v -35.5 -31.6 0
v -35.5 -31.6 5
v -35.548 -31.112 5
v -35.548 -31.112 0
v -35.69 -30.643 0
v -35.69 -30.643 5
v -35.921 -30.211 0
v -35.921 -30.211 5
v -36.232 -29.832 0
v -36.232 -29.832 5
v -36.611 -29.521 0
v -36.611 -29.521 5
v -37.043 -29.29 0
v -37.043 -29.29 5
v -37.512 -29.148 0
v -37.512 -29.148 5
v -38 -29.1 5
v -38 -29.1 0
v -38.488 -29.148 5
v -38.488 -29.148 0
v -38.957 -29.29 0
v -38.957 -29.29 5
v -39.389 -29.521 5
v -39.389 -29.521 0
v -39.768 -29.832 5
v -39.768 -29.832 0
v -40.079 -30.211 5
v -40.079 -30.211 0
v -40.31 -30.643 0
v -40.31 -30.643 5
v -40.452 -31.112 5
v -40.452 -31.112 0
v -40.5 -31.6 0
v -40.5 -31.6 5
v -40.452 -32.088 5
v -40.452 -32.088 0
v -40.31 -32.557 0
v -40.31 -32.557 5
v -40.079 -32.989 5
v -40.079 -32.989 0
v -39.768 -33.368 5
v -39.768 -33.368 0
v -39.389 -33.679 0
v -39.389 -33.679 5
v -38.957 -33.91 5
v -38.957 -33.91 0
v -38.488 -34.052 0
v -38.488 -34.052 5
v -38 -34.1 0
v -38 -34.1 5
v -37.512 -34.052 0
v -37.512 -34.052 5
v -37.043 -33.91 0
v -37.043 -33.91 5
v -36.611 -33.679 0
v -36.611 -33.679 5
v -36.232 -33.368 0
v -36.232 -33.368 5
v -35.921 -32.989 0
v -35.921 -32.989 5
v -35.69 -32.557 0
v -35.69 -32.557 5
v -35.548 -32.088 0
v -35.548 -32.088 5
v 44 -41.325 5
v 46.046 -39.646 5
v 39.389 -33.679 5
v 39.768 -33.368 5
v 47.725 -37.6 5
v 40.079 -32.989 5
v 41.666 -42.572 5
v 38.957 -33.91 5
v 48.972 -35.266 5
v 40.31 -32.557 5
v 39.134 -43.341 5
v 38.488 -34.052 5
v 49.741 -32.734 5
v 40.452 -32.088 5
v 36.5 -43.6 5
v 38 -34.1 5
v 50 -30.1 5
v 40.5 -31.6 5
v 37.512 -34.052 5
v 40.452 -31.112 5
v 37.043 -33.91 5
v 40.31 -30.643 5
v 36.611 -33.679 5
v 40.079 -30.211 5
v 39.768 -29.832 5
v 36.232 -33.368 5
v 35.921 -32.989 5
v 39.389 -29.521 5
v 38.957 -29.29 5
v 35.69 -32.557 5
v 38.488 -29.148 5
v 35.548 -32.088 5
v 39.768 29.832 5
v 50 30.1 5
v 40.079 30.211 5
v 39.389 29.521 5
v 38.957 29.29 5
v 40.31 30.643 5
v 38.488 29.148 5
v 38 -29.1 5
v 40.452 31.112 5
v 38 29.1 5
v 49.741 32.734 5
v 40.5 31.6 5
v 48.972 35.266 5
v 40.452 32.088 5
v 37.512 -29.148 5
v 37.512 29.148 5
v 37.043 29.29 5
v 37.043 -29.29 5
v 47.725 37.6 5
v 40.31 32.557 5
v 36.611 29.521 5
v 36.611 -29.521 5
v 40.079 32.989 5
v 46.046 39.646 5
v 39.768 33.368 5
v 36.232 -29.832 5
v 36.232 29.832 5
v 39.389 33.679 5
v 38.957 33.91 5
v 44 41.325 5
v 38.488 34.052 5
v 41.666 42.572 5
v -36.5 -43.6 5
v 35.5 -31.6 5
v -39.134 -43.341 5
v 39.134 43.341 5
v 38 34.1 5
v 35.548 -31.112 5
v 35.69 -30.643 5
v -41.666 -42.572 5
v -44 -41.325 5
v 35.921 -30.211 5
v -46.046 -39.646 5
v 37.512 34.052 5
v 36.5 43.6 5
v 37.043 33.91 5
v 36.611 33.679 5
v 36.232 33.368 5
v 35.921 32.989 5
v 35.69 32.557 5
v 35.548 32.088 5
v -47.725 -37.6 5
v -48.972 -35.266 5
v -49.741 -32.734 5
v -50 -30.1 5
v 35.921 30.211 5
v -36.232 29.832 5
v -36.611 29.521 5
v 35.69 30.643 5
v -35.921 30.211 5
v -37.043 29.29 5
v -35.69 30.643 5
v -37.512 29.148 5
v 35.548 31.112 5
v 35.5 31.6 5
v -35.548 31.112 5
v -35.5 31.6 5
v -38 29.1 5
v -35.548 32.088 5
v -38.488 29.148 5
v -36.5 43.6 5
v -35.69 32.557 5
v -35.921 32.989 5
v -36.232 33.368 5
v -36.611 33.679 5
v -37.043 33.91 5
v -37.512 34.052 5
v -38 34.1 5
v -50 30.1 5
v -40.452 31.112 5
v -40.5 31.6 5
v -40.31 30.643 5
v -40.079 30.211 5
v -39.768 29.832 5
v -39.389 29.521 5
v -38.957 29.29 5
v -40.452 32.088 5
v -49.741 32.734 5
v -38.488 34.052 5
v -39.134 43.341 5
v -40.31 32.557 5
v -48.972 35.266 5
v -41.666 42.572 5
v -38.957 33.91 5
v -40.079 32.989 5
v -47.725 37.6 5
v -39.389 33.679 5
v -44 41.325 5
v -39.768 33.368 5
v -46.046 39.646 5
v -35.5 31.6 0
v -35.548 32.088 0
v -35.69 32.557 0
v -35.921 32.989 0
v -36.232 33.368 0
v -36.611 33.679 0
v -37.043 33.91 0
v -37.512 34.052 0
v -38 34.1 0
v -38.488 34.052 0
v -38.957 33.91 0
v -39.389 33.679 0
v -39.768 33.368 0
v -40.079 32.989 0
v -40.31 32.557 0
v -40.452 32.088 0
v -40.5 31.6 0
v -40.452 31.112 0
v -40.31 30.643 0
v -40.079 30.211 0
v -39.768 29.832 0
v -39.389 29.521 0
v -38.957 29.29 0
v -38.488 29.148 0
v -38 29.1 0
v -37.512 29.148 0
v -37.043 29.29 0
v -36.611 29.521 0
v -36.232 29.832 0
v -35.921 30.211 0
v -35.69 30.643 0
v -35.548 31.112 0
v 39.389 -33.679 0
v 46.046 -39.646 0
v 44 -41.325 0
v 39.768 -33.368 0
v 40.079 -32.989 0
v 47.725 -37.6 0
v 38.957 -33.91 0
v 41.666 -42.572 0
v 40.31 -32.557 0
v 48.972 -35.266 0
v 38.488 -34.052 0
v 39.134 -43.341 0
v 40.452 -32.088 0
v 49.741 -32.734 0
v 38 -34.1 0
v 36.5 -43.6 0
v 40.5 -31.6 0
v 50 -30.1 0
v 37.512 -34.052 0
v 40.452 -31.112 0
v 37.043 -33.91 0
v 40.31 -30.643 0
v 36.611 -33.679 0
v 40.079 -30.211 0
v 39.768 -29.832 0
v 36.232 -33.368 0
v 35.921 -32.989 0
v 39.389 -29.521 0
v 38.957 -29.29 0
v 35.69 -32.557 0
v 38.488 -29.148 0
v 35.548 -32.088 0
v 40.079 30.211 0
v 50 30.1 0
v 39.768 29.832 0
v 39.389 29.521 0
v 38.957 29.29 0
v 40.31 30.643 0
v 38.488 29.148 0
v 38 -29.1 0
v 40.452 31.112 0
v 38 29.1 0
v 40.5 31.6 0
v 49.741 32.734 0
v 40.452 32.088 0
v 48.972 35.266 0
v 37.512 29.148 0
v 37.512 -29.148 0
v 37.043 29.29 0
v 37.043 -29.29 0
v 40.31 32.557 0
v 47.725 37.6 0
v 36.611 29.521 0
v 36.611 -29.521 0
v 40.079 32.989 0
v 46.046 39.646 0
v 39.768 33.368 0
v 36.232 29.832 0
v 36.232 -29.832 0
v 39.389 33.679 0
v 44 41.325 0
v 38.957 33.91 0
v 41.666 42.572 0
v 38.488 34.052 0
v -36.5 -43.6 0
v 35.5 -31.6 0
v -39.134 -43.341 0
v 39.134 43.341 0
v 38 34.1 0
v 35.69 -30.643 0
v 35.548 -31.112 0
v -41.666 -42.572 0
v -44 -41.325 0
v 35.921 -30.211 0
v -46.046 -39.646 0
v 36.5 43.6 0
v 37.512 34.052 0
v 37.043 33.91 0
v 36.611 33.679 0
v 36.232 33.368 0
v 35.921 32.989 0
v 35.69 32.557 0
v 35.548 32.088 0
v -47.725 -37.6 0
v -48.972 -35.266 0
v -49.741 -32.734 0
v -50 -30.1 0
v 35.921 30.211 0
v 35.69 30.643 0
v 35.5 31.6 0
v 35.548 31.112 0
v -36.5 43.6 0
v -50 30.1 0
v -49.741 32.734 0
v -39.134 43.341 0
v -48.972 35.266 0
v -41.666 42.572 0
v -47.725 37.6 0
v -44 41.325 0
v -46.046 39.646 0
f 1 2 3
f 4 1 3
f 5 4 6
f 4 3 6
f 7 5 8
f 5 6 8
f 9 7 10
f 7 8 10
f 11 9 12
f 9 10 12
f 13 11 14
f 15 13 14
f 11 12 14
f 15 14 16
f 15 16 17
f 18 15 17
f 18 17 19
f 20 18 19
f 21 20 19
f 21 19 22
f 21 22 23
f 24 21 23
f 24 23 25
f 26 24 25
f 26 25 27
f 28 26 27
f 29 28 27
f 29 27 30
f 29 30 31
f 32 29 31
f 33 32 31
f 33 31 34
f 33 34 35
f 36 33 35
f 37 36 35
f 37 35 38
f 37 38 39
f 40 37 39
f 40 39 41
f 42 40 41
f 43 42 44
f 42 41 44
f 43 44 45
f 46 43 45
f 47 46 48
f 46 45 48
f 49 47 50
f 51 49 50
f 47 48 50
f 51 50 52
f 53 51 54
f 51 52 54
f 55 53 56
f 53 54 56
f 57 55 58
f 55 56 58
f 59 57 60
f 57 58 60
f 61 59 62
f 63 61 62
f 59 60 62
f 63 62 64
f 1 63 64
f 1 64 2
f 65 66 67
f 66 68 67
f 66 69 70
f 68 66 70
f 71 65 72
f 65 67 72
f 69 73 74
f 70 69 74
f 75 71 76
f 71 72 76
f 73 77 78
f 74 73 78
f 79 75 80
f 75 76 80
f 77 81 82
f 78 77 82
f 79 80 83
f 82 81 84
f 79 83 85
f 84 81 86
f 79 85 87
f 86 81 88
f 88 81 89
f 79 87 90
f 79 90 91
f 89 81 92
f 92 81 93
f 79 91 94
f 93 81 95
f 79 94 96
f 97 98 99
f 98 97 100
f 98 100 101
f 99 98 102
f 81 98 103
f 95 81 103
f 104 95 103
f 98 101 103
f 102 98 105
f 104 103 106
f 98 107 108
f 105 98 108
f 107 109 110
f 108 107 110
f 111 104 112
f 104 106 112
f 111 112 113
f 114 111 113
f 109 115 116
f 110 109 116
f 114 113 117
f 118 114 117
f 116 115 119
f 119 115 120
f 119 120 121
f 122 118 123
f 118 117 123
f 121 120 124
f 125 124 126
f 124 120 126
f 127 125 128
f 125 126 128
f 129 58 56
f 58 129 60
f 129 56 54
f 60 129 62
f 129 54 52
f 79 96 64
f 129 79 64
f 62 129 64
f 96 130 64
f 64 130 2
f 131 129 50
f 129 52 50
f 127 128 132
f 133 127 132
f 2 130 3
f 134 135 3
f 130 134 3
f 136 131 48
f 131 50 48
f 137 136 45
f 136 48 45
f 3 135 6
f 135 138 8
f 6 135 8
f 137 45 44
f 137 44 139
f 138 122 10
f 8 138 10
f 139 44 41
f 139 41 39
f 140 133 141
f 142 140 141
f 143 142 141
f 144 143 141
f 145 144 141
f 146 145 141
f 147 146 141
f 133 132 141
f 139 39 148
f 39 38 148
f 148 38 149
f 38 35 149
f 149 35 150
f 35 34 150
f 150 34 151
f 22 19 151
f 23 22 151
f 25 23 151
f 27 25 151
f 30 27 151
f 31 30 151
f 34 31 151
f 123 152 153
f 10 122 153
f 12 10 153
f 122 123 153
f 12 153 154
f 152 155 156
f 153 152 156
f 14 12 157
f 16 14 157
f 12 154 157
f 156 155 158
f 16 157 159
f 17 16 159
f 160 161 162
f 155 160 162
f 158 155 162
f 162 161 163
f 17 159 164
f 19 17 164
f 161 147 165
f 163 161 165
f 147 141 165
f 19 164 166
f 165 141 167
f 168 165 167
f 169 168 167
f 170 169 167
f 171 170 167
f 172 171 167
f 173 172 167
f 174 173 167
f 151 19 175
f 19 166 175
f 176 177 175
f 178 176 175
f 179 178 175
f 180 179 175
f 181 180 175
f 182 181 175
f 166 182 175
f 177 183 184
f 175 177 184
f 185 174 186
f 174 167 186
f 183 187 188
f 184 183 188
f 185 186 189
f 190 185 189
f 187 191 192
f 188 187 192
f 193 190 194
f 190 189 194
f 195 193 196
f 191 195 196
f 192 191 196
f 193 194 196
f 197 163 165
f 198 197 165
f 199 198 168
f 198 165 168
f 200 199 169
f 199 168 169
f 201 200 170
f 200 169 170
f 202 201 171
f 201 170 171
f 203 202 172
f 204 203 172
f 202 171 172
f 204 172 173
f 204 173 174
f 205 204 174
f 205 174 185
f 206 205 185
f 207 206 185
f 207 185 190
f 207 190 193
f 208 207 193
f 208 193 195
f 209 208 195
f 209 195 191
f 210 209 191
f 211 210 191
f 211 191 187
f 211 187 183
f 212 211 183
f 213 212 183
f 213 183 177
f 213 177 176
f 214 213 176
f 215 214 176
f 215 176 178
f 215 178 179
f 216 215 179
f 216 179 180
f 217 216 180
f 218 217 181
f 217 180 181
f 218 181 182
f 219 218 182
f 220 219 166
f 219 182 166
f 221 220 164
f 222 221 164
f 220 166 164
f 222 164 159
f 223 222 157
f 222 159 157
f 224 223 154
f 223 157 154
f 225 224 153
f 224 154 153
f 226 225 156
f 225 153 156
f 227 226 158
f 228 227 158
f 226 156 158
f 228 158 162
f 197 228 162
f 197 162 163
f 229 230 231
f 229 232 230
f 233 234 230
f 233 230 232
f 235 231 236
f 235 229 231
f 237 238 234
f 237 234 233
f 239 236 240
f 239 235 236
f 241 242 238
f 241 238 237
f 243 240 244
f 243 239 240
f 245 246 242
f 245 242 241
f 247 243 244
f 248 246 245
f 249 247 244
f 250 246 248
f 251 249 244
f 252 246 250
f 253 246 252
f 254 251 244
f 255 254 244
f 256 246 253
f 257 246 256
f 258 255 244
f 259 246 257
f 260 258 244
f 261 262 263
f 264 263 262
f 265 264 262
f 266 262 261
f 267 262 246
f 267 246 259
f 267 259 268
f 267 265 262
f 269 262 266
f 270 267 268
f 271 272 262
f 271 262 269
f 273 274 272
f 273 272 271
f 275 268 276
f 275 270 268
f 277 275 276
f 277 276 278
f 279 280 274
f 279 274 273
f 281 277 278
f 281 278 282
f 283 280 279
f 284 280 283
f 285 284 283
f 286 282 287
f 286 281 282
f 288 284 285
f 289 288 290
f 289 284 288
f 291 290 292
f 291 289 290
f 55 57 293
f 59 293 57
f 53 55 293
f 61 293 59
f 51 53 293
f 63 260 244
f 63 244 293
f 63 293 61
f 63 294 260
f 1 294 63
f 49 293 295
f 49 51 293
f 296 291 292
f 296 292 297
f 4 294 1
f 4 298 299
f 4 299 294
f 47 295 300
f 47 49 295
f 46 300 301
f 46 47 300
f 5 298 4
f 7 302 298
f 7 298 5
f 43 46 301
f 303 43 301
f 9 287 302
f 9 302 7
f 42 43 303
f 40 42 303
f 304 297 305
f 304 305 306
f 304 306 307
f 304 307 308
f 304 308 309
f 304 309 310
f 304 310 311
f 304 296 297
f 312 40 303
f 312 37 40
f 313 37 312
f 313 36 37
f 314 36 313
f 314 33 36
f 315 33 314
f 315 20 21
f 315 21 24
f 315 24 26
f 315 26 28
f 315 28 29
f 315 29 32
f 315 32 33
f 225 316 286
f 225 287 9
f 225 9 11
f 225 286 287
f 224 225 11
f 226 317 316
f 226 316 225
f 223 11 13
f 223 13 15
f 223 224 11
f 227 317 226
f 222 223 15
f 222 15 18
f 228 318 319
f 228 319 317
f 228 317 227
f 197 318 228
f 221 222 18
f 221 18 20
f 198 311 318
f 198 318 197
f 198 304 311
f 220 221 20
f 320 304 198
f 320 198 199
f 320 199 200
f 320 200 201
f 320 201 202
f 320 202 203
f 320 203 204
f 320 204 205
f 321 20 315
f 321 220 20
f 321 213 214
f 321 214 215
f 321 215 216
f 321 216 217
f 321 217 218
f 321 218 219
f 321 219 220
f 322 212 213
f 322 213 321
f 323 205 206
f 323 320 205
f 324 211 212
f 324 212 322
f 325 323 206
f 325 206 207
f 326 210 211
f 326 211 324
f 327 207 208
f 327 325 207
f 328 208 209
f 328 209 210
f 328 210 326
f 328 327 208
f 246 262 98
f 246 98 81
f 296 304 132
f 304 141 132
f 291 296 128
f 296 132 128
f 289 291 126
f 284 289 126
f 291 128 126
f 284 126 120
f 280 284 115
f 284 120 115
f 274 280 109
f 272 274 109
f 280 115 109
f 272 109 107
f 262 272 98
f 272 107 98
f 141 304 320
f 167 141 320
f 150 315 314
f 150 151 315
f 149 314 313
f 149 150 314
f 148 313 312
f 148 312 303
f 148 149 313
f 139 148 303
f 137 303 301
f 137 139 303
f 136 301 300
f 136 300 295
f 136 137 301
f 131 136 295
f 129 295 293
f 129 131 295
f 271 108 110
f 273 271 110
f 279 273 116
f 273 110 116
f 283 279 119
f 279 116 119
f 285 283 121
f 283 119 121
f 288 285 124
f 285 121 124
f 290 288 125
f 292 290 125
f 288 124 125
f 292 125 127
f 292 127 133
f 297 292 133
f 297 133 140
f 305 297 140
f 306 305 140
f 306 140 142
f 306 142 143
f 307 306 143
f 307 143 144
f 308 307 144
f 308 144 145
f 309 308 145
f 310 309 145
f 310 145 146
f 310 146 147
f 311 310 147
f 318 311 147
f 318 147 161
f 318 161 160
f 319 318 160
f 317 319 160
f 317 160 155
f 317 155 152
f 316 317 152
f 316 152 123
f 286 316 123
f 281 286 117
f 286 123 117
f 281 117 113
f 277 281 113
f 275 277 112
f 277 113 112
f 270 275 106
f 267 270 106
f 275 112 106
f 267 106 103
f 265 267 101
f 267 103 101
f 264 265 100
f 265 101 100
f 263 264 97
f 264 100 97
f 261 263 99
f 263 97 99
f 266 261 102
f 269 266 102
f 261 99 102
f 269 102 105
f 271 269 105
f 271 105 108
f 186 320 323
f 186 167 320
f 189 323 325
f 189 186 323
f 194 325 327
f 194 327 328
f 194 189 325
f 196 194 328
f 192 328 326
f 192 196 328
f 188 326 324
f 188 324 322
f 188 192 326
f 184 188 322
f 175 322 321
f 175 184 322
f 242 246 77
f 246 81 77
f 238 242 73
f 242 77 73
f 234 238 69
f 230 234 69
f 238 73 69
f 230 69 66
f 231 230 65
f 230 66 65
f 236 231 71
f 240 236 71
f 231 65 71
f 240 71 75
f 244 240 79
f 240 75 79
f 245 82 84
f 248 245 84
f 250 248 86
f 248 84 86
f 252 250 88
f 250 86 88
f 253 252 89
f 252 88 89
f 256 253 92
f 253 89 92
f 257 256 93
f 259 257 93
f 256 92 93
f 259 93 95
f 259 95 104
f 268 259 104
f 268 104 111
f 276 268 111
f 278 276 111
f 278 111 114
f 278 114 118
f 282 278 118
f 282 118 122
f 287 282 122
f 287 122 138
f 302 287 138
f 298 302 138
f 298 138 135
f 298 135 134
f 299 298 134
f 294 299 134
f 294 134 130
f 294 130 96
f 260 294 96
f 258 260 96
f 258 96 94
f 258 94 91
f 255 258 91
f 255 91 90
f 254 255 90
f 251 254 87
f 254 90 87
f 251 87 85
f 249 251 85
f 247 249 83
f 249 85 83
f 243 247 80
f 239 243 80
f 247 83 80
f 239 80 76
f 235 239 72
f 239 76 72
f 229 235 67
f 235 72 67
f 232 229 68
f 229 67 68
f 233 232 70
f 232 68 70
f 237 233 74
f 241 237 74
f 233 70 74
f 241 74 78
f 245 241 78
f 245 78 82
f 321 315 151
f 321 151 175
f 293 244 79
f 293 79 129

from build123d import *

# Parameters (mm, degrees)
Y_KSEKLIK_EKSTR_ZYON1_DEPTH = 5
IZIM2_R                     = 2.5
KES_EKSTR_ZYON1_DEPTH       = 10
RADYUS1_R                   = 13.5


with BuildPart() as part:
    # Çizim1 → Yükseklik-Ekstrüzyon1 (new body)
    with BuildSketch(Plane.XY):
        Polygon((21, 43.6), (50, 43.6), (50, -43.6), (-50, -43.6), (-50, 43.6), (-21, 43.6), align=None)
    extrude(amount=Y_KSEKLIK_EKSTR_ZYON1_DEPTH)

    # Çizim2 → Kes-Ekstrüzyon1 (cut)
    with BuildSketch(Plane.XY.offset(5)):
        with Locations((38, -31.6)):
            Circle(IZIM2_R)
        with Locations((38, 31.6)):
            Circle(IZIM2_R)
        with Locations((-38, 31.6)):
            Circle(IZIM2_R)
        with Locations((-38, -31.6)):
            Circle(IZIM2_R)
    extrude(amount=-KES_EKSTR_ZYON1_DEPTH, mode=Mode.SUBTRACT)

    # Radyus1
    radyus1_edges = [part.edges().sort_by_distance(p)[0] for p in [
        (50, -43.6, 2.5),
        (-50, -43.6, 2.5),
        (-50, 43.6, 2.5),
        (50, 43.6, 2.5),
    ]]
    fillet(radyus1_edges, radius=RADYUS1_R)


solid = part.part
